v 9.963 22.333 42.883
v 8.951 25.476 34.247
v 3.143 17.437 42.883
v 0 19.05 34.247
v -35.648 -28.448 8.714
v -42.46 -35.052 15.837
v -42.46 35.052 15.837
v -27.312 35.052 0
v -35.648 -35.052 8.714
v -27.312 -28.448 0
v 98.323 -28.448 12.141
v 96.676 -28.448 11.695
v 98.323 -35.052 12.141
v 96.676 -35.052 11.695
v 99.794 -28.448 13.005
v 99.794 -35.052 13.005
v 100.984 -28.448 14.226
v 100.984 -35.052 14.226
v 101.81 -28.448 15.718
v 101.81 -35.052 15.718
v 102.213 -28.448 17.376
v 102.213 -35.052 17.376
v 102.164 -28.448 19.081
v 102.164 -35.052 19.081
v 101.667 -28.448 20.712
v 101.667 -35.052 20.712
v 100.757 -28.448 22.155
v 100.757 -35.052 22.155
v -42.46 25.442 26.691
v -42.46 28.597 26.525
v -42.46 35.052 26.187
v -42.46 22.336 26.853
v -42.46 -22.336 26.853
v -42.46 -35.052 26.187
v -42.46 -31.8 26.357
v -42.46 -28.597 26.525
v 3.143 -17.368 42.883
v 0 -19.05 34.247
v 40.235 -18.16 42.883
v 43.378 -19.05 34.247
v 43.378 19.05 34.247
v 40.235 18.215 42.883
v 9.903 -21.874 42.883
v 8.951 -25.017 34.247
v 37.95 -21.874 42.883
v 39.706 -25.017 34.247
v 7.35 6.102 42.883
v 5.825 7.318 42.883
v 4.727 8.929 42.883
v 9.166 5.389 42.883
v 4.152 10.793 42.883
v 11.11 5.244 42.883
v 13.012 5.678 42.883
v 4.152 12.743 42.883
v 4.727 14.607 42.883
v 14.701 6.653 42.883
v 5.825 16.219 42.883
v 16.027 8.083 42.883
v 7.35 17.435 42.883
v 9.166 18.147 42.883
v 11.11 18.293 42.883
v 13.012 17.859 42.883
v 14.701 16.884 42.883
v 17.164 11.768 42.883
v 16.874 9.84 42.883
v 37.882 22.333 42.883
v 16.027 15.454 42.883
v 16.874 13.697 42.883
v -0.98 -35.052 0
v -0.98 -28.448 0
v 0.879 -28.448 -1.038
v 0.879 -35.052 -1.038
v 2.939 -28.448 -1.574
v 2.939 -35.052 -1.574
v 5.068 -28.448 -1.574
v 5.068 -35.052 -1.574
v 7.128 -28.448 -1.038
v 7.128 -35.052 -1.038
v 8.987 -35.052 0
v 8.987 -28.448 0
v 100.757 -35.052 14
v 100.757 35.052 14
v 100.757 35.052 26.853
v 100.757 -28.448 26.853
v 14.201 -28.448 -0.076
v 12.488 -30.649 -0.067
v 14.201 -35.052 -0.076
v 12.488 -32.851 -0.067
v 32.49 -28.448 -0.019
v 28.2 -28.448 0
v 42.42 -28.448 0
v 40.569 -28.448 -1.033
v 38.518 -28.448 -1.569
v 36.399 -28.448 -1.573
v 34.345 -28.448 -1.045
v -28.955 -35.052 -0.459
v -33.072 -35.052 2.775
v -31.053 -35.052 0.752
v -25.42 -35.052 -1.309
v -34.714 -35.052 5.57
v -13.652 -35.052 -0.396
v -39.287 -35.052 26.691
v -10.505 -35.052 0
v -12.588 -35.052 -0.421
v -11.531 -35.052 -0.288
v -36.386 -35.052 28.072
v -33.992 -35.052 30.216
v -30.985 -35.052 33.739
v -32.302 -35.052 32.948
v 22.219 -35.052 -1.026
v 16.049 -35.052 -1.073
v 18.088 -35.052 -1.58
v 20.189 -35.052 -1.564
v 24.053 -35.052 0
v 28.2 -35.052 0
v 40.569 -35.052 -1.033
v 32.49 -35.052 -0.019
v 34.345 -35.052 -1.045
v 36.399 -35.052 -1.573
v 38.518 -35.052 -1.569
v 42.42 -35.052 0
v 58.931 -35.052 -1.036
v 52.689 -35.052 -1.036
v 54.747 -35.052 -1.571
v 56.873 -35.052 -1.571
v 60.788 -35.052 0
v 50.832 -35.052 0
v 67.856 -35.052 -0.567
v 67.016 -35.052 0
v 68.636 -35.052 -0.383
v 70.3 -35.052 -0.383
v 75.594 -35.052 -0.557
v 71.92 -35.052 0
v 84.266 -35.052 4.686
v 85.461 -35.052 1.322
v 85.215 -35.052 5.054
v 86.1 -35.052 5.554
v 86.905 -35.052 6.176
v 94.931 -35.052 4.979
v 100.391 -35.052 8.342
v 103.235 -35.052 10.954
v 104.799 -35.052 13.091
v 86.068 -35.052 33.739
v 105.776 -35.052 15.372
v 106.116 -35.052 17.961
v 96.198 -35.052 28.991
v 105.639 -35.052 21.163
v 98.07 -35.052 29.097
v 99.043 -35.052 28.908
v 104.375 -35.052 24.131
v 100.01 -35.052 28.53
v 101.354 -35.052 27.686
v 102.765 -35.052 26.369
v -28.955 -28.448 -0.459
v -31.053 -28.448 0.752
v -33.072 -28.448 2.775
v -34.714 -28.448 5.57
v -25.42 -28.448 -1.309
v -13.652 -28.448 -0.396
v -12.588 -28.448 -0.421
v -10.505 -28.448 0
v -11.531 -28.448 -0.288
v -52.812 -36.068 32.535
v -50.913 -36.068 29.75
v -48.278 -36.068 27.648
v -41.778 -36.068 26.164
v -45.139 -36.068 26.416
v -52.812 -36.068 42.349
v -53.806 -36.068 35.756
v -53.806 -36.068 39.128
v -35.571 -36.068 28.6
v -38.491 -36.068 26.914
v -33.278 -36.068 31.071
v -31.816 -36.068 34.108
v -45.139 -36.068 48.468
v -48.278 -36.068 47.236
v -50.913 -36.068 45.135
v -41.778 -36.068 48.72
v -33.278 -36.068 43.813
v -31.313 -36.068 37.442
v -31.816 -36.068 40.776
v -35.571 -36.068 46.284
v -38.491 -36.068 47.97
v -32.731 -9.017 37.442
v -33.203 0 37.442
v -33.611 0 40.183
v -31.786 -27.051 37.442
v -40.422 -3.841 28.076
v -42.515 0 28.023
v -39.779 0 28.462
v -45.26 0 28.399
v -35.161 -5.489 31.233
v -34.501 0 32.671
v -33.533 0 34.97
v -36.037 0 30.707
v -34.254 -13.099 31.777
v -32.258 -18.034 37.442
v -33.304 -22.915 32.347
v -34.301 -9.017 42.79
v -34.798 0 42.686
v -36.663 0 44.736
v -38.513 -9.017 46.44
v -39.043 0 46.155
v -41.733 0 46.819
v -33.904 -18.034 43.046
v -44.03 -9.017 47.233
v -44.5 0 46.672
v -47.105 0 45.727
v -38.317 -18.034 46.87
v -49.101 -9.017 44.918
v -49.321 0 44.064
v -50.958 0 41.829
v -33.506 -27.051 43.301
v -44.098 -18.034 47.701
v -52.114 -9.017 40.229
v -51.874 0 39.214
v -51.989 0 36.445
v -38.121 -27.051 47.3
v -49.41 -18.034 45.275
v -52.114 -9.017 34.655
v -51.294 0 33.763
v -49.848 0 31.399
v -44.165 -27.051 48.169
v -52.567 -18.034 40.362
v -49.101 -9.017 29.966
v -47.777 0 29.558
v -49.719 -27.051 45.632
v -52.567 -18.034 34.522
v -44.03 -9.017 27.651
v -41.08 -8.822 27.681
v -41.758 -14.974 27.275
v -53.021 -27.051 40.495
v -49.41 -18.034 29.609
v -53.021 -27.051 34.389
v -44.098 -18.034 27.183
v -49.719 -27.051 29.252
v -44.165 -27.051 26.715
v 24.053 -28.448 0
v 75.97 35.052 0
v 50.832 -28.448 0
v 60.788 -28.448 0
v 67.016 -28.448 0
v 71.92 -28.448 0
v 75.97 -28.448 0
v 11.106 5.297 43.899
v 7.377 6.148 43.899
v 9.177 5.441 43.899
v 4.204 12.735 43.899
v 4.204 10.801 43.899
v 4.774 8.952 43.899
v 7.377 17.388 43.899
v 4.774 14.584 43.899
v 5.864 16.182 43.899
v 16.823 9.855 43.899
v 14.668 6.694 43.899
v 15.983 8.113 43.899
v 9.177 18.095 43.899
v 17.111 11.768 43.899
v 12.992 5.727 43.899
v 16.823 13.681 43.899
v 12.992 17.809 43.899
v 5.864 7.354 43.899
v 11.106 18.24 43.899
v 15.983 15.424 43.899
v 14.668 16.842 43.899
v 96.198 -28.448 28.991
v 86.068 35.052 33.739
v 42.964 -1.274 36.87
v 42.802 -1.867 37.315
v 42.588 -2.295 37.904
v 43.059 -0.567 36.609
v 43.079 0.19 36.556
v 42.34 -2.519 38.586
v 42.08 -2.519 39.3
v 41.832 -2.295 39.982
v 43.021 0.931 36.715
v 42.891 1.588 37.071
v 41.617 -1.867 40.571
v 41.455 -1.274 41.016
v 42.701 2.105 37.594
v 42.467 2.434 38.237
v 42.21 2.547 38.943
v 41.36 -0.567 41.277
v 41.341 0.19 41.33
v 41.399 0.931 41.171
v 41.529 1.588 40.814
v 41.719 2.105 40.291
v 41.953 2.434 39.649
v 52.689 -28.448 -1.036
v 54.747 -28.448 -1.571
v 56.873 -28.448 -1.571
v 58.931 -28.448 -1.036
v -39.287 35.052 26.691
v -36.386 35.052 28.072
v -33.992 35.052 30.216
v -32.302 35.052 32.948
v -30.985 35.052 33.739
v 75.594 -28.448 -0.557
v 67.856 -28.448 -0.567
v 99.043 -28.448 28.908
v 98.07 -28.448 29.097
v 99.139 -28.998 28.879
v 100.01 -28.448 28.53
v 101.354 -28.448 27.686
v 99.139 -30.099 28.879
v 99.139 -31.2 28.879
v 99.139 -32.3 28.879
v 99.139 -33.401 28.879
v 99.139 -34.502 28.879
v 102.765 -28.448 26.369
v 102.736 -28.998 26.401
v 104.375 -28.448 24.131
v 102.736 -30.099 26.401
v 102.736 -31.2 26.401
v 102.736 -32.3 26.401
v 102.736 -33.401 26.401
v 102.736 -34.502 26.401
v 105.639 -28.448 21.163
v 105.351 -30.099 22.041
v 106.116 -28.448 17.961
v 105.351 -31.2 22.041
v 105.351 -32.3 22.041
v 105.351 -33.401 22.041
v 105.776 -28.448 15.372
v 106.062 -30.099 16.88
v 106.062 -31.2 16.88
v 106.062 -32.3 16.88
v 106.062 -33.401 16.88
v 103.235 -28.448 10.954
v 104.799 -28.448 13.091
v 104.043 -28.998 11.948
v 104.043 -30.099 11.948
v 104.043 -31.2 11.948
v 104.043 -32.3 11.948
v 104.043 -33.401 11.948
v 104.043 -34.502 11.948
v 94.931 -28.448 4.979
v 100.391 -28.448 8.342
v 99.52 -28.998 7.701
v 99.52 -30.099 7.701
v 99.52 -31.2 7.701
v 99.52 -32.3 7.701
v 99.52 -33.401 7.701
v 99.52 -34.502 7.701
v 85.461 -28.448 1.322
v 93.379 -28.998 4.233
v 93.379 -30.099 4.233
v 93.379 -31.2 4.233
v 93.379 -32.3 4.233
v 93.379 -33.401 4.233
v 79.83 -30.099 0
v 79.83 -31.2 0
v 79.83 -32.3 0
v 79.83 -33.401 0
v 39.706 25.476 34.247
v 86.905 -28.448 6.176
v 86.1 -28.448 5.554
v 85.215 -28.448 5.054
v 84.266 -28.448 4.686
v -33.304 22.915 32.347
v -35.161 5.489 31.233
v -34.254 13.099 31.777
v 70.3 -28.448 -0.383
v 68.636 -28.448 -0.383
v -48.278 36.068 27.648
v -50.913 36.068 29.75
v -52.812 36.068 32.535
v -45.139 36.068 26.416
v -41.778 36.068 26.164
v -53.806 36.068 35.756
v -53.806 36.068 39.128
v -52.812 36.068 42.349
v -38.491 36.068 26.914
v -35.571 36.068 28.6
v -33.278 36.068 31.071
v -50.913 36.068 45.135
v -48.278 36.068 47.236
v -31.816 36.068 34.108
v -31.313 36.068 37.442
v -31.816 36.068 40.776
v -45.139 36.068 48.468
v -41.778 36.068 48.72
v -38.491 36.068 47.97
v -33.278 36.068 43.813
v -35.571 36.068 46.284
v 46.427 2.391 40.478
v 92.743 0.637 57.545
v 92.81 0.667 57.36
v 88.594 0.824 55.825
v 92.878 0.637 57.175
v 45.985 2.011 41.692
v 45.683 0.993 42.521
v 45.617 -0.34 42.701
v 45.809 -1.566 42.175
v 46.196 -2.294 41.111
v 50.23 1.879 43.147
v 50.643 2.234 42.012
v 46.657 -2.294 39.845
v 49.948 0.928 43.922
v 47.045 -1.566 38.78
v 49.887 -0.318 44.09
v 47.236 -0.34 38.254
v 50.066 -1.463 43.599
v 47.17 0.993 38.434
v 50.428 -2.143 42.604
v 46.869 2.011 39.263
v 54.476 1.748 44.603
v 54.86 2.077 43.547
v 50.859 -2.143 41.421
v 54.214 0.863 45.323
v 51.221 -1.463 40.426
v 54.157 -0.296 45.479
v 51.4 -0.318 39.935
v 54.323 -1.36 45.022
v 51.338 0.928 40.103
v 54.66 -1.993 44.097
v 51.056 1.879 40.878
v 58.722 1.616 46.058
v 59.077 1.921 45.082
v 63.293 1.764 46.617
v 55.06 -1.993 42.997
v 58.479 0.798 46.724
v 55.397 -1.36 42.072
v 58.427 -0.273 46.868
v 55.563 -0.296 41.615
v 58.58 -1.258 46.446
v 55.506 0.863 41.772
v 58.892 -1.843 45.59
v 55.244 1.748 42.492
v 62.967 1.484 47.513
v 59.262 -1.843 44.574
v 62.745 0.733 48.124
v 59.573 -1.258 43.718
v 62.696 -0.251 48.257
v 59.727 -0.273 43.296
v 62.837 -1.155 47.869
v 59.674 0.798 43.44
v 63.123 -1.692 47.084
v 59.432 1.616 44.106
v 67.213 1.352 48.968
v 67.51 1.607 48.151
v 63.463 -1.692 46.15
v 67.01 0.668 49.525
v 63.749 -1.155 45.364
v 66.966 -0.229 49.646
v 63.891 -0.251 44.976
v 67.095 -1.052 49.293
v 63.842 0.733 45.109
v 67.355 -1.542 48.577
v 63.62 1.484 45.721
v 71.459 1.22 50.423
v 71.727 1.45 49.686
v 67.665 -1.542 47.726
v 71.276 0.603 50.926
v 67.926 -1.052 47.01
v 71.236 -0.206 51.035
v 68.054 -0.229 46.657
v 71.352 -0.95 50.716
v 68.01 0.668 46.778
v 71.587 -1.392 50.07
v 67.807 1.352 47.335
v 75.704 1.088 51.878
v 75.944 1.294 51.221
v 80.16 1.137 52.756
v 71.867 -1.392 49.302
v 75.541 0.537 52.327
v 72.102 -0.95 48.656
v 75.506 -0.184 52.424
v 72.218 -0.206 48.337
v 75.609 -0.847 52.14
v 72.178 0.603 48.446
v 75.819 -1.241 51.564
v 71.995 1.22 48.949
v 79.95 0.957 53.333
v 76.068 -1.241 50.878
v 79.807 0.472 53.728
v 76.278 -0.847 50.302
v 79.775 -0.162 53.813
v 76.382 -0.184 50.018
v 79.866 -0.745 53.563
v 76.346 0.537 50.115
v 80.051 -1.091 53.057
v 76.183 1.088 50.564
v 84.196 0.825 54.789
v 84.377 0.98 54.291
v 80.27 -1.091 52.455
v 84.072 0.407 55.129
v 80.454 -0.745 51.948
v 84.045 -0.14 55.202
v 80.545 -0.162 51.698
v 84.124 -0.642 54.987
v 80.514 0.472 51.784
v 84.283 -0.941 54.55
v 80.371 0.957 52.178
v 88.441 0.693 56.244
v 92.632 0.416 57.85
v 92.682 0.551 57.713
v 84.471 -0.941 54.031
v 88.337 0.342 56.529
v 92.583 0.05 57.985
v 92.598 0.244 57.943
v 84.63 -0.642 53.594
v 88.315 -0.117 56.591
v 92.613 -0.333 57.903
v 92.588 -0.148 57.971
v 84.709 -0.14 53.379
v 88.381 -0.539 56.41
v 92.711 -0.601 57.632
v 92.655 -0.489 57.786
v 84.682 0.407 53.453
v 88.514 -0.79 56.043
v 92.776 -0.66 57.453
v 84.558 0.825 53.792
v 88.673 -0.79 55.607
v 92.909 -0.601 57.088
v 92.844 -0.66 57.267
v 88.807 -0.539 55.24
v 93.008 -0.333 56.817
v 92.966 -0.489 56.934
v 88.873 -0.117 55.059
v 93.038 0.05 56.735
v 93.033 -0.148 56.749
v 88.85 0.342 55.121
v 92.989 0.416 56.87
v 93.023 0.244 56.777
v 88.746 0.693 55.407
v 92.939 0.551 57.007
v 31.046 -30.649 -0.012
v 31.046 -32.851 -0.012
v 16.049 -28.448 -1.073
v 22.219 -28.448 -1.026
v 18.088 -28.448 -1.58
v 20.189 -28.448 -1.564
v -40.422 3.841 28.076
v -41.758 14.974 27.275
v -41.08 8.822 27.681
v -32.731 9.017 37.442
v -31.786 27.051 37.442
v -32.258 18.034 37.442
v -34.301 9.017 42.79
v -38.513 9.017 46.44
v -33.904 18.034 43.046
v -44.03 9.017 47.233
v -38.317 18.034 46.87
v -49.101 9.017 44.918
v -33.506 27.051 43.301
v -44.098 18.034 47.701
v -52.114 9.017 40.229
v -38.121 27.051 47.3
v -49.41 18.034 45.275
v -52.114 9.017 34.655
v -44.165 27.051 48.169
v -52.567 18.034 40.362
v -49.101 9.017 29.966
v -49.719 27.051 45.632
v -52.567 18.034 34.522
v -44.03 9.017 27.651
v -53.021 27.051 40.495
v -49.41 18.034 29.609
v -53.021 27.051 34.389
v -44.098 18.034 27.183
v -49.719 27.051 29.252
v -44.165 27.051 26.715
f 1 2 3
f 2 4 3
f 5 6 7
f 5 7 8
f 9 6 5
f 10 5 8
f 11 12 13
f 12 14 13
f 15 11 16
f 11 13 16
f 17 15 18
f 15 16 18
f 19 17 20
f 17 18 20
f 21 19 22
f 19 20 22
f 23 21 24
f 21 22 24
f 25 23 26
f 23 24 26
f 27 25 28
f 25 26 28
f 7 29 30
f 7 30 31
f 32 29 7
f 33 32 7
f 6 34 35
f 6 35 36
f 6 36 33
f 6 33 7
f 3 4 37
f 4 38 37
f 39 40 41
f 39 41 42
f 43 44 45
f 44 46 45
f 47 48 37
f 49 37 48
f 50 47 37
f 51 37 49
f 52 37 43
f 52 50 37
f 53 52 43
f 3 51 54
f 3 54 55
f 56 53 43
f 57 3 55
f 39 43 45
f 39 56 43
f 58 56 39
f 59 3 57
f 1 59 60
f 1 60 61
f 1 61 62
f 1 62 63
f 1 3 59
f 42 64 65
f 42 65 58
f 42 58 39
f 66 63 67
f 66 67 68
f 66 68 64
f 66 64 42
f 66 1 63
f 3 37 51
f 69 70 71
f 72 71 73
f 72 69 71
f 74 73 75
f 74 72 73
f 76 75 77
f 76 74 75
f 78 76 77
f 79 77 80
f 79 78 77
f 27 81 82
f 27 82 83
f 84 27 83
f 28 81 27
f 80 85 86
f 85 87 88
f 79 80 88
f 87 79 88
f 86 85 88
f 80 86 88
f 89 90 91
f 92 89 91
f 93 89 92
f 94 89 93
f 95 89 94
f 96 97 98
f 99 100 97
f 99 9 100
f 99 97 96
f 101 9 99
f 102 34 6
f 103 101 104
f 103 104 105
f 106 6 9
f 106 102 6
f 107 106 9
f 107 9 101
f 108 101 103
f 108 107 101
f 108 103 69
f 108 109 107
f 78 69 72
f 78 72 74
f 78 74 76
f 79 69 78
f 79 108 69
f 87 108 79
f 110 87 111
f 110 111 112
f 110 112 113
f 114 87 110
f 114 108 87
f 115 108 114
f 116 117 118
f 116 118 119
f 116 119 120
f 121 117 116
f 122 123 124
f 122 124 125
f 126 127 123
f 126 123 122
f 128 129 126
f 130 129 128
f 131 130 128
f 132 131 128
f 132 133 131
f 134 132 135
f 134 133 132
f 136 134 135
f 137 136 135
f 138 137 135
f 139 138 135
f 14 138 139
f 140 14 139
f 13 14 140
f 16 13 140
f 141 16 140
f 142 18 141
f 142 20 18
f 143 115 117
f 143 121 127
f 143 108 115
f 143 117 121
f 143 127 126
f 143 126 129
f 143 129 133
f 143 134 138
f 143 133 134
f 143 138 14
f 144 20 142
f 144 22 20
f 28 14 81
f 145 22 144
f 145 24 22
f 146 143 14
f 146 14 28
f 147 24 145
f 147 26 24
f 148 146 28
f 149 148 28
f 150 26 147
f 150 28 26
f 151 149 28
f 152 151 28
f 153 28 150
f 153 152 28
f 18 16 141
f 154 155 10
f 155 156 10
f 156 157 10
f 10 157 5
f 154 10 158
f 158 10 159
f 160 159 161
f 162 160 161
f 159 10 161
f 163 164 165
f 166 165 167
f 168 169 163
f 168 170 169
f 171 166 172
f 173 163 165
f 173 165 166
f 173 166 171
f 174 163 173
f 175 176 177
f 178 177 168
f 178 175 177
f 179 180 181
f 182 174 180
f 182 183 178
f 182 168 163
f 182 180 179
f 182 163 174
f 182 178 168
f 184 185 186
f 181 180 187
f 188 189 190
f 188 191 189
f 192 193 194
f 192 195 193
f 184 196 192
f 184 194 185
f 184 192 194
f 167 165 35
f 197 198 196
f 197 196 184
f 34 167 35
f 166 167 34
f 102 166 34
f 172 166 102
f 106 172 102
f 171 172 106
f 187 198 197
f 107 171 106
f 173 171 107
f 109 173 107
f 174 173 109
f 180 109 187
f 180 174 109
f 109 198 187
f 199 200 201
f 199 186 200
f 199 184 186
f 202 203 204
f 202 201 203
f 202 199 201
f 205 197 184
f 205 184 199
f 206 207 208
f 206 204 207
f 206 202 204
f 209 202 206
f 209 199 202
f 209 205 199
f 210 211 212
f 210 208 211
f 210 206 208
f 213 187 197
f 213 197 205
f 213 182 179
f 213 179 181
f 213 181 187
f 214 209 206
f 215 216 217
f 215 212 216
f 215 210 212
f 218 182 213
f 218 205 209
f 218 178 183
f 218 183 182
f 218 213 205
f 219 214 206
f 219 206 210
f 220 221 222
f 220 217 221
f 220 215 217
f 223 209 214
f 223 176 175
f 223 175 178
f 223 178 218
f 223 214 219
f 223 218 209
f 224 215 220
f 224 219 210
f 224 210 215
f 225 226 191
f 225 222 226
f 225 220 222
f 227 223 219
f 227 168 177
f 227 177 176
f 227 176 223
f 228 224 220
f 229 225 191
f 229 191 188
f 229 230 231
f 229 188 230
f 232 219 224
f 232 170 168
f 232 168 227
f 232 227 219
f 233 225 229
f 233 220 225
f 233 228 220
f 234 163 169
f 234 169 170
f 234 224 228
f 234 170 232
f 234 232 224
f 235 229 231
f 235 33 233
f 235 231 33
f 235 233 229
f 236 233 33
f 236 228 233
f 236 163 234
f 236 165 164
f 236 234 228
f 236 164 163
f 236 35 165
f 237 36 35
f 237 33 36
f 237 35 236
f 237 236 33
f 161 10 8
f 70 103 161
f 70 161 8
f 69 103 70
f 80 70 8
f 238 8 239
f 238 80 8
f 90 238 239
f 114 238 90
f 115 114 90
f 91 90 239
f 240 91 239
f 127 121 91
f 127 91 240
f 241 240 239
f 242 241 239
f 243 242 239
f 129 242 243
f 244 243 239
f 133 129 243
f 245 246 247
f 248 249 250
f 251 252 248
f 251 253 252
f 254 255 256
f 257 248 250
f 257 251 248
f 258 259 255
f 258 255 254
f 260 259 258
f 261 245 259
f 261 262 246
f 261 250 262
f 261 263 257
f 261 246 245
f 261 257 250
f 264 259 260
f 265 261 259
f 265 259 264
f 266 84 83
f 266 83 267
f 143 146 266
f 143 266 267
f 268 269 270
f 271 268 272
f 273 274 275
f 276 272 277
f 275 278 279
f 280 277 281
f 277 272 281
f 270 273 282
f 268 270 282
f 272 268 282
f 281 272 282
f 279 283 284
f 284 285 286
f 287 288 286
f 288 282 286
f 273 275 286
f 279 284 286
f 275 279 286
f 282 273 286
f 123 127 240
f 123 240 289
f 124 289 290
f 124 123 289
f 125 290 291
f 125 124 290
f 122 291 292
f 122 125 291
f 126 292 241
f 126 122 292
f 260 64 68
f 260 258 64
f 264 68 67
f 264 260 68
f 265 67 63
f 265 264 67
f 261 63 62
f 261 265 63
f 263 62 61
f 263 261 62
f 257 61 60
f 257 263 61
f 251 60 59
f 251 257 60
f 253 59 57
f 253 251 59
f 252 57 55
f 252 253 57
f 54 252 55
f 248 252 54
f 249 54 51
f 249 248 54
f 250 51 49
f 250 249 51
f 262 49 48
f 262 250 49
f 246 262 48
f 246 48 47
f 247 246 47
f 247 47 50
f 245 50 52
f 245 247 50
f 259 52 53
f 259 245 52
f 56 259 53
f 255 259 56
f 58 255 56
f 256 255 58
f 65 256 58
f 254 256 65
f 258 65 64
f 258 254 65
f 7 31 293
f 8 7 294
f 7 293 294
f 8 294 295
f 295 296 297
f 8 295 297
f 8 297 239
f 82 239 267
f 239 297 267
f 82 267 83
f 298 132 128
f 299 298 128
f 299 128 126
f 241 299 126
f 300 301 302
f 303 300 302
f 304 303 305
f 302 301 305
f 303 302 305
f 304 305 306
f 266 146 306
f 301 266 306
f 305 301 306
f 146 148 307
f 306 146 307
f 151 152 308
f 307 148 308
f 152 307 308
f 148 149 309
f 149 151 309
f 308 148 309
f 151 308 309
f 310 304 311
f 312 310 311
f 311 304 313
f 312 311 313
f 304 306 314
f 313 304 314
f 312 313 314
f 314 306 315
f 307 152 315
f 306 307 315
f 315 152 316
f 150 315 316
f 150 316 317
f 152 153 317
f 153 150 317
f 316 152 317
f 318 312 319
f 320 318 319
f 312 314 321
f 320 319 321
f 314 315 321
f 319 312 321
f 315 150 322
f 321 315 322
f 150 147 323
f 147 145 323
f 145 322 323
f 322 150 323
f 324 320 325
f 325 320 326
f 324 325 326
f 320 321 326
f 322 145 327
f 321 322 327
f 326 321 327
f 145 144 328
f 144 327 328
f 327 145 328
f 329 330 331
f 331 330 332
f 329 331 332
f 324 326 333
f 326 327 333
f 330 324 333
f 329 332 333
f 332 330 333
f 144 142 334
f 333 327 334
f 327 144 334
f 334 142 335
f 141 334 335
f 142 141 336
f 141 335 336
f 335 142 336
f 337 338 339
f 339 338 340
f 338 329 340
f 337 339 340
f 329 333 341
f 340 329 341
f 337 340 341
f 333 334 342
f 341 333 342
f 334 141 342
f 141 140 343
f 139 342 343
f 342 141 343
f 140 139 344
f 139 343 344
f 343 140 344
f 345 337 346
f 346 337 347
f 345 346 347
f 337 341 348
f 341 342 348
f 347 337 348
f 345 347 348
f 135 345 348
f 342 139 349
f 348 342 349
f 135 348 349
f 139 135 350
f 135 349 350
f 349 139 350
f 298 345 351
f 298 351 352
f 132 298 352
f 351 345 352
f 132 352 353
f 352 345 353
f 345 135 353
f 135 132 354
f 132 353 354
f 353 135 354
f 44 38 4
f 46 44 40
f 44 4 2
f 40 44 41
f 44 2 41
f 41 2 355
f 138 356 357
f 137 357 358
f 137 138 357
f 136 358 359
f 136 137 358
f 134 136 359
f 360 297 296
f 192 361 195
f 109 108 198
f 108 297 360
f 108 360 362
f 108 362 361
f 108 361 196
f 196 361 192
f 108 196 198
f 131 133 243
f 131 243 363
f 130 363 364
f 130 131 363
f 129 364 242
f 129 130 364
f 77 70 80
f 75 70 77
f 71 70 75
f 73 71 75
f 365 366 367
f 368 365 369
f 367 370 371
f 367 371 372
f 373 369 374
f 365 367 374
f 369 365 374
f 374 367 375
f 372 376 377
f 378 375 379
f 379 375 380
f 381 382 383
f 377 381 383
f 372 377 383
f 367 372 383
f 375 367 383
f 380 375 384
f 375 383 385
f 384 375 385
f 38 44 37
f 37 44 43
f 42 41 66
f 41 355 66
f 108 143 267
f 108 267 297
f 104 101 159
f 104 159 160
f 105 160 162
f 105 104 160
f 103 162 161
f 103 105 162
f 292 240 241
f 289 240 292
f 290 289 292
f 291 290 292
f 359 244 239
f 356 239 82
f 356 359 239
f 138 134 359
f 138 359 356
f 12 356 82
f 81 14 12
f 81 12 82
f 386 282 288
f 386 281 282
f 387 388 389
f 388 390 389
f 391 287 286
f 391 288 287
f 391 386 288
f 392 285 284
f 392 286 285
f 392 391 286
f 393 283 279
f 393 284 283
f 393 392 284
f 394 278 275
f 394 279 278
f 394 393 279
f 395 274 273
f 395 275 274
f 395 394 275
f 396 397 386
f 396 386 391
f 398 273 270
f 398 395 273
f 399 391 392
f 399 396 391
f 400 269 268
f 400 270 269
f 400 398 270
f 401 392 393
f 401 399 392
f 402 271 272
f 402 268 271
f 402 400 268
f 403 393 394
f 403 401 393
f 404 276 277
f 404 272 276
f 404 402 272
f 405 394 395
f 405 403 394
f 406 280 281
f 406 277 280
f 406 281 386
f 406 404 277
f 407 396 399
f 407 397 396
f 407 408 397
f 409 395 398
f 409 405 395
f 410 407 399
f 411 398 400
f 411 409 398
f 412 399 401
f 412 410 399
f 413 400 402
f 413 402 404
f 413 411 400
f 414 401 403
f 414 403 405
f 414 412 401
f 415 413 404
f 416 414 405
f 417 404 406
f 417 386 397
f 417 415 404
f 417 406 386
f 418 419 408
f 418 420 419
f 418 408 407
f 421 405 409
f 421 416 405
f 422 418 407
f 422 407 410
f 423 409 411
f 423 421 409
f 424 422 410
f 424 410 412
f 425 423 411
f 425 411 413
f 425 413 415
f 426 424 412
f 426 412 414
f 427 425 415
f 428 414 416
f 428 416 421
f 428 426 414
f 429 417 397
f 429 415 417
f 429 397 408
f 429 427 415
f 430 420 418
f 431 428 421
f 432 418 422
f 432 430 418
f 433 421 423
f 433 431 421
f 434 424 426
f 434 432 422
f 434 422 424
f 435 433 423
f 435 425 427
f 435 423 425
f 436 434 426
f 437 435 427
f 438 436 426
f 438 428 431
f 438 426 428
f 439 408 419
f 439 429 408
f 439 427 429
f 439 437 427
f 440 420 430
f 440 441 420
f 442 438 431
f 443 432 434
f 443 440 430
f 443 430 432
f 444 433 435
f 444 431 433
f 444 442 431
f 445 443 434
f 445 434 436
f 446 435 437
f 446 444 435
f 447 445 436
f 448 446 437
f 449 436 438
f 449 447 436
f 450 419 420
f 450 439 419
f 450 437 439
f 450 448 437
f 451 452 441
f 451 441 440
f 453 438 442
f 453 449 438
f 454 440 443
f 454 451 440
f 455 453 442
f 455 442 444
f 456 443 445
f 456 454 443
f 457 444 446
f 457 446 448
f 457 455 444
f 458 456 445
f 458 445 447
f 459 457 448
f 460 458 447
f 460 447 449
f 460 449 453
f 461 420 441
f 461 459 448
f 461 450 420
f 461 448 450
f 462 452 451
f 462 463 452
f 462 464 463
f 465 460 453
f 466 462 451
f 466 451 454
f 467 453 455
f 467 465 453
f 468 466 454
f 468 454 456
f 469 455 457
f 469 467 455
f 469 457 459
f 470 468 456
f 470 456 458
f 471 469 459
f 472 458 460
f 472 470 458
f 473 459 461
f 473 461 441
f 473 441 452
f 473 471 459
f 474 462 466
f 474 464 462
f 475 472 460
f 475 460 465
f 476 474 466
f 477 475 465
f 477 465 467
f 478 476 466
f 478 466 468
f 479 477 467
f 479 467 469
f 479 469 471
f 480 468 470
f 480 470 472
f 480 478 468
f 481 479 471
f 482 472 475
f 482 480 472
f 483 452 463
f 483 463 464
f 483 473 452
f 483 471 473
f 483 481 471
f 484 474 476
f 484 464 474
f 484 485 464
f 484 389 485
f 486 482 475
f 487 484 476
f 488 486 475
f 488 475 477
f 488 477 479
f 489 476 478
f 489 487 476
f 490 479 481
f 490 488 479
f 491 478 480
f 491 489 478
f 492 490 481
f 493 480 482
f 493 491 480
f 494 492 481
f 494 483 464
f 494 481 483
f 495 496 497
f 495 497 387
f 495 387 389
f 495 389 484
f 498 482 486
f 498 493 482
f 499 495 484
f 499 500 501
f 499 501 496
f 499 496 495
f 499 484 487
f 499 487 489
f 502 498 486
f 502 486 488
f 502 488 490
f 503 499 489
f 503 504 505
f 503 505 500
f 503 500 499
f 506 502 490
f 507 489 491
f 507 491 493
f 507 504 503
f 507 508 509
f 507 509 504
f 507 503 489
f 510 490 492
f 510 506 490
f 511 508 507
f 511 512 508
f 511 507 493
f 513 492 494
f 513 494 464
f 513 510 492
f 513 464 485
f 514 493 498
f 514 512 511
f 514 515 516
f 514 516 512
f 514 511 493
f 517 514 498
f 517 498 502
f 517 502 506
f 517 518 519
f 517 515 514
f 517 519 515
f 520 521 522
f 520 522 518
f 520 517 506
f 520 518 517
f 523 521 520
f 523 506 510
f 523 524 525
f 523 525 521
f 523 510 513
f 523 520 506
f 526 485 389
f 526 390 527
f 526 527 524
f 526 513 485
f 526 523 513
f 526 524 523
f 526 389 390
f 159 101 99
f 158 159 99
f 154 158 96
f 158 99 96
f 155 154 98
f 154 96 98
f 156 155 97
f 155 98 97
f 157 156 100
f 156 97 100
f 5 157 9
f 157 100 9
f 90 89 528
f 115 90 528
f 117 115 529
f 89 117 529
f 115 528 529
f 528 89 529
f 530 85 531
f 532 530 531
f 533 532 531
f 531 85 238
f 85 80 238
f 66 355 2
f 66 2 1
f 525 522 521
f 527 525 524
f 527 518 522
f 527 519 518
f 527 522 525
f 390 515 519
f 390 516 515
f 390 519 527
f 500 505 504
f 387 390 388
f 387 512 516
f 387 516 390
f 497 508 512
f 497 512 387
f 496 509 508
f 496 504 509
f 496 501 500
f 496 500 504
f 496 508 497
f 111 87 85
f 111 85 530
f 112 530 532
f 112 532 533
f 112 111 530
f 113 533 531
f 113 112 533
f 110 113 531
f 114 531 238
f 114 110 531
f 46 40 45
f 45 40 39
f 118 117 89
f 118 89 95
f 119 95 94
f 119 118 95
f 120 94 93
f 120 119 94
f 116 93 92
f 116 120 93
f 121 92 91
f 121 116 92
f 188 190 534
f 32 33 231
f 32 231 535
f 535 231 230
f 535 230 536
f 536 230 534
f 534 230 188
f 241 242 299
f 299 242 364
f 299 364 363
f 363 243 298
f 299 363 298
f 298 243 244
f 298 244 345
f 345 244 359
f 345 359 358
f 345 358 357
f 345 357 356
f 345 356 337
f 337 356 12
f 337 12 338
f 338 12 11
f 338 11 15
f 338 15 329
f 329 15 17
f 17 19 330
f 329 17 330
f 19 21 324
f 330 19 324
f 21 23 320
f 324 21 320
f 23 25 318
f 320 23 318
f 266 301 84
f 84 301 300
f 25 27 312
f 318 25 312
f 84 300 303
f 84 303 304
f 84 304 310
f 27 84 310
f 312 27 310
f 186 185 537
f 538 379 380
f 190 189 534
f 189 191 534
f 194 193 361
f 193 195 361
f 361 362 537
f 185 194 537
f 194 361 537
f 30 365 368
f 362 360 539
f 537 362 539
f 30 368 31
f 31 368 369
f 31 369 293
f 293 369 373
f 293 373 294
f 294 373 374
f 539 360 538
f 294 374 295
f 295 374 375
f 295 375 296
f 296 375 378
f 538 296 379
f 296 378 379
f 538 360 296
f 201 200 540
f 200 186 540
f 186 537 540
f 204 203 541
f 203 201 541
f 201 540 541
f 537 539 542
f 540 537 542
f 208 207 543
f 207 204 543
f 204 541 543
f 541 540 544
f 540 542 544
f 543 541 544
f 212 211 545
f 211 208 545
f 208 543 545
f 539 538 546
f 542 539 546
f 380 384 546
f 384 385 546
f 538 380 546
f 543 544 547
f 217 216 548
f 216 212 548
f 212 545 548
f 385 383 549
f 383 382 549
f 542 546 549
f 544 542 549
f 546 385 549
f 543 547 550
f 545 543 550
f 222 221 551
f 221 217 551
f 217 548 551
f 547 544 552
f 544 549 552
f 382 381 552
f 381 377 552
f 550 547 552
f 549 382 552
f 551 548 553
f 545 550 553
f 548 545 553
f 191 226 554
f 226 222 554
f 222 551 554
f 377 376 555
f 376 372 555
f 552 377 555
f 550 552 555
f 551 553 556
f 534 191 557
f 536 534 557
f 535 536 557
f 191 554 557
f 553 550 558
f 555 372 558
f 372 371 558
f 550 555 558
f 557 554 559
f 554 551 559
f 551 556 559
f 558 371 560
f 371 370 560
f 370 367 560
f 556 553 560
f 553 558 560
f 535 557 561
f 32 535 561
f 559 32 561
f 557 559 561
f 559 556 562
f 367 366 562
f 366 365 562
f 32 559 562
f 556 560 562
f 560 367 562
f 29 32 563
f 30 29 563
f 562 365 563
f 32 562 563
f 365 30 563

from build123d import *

# Parameters (mm, degrees)
F1_DEPTH  = 35.052
F4_DEPTH  = 8.636
F4_TAPER  = 20
F6_R      = 2.5473797884
F7_DEPTH  = 53.848
F7_TAPER  = 2
F8_R      = 9.4193845987
F9_DEPTH  = 36.068
F9_TAPER  = -3
F11_R     = 6.5429136155
F12_DEPTH = 1.016
F12_TAPER = 3
F14_R     = 6.4058769263
F15_DEPTH = 6.604


with BuildPart() as f1:
    # F0 (on Front) → F1 (new body, symmetric)
    with BuildSketch(Plane.XZ):
        Polygon((-27.3123774678, 0), (0, 0), (75.9697407484, 0), (100.7574498653, 14.0004679561), (100.7574498653, 26.8533546478), (86.0684290528, 33.7388291955), (-30.9846308082, 33.7388291955), (-42.4604192376, 26.8533546478), (-42.4604192376, 15.836596489), align=None)
    extrude(amount=F1_DEPTH, both=True)

    # F8 (on Front) → F9 (join, symmetric)
    with BuildSketch(Plane.XZ):
        with Locations((-42.62271896, 37.4420583248)):
            Circle(F8_R)
    extrude(amount=F9_DEPTH, both=True, taper=F9_TAPER)

    # F14 (on offset) → F15 (join)
    with BuildSketch(Plane.XZ.offset(35.052)):
        with BuildLine():
            ThreePointArc((-18.2914277318, 11.5336464741), (-18.238567493, 11.0237022138), (-18.2209195306, 10.5113293976))
            ThreePointArc((-18.2209195306, 10.5113293976), (-18.690216693, 7.9095667226), (-20.0389570113, 5.6357355069))
            ThreePointArc((-20.0389570113, 5.6357355069), (-17.8768605229, 1.5281653135), (-13.6524536622, -0.3956800012))
            add(Edge.make_bspline(
                [(-10.5050824736, 0), (-11.5477199799, -0.1099032554), (-12.6000289403, -0.2485209166), (-13.6524536622, -0.3956800012)],
                knots=[0.8894547449, 0.8894547449, 0.8894547449, 0.8894547449, 0.898296643, 0.898296643, 0.898296643, 0.898296643], degree=3))
            ThreePointArc((-10.5050824736, 0), (-7.0773531131, 2.6258490959), (-5.7778356714, 6.7435749806))
            ThreePointArc((-5.7778356714, 6.7435749806), (-10.3869168212, 13.4431042769), (-18.2914277318, 11.5336464741))
        make_face()
        with BuildLine():
            ThreePointArc((-20.0389570113, 5.6357355069), (-32.8074565022, 12.6268435661), (-18.2914277318, 11.5336464741))
            ThreePointArc((-18.2914277318, 11.5336464741), (-10.3869168212, 13.4431042769), (-5.7778356714, 6.7435749806))
            ThreePointArc((-5.7778356714, 6.7435749806), (-7.0773531131, 2.6258490959), (-10.5050824736, 0))
            add(Edge.make_bspline(
                [(-1.4377133298, 0.3632930094), (-4.360674288, 0.4004144231), (-7.3897049606, 0.3283884651), (-10.5050824736, 0)],
                knots=[0.8630353512, 0.8630353512, 0.8630353512, 0.8630353512, 0.8894547449, 0.8894547449, 0.8894547449, 0.8894547449], degree=3))
            ThreePointArc((-1.4377133298, 0.3632930094), (-1.1320375241, 13.372378396), (11.5408509223, 10.4181206688))
            ThreePointArc((11.5408509223, 10.4181206688), (20.9600888035, 14.9107300047), (27.4564847059, 6.7435749806))
            ThreePointArc((27.4564847059, 6.7435749806), (26.5572949313, 2.966608588), (24.0526490745, 0))
            add(Edge.make_bspline(
                [(32.4903987489, -0.0193167116), (29.5866199223, -0.0057281236), (26.7519183568, 0.012216448), (24.0526490745, 0)],
                knots=[0.7505457387, 0.7505457387, 0.7505457387, 0.7505457387, 0.7777542378, 0.7777542378, 0.7777542378, 0.7777542378], degree=3))
            ThreePointArc((32.4903987489, -0.0193167116), (33.6507739321, 14.2190238146), (45.8242892928, 6.7435749806))
            ThreePointArc((45.8242892928, 6.7435749806), (44.9250995182, 2.966608588), (42.4204536614, 0))
            add(Edge.make_bspline(
                [(50.6332553293, 0.1512836344), (47.927415051, 0.1101522639), (45.1762033046, 0.036614238), (42.4204536614, 0)],
                knots=[0.6948509829, 0.6948509829, 0.6948509829, 0.6948509829, 0.720052008, 0.720052008, 0.720052008, 0.720052008], degree=3))
            ThreePointArc((50.6332553293, 0.1512836344), (50.5277699262, 13.2516481983), (63.32628389, 10.4536633528))
            ThreePointArc((63.32628389, 10.4536633528), (69.0279887166, 13.9055593882), (75.1095131316, 11.1779074751))
            ThreePointArc((75.1095131316, 11.1779074751), (82.0466679625, 18.5321466628), (89.2645921606, 11.4532681182))
            ThreePointArc((89.2645921606, 11.4532681182), (84.513834766, 4.7672305336), (76.6369867203, 7.0537255085))
            ThreePointArc((76.6369867203, 7.0537255085), (76.6420160513, 6.8986864896), (76.6436927562, 6.7435749806))
            ThreePointArc((76.6436927562, 6.7435749806), (71.3938787613, -0.1686991502), (63.32628389, 3.0334866085))
            ThreePointArc((63.32628389, 3.0334866085), (62.2387569182, 1.3648978533), (60.788254523, 0))
            add(Edge.make_bspline(
                [(-35.5579517782, 13.3371446282), (-34.5184446926, 17.9286186225), (-26.3512458362, 25.383448883), (-15.4597608895, 14.7250766477), (0.0686718679, 20.4326772039), (15.8560525983, 17.8310843141), (28.9072902188, 16.8316877811), (46.8073326751, 17.4266330572), (63.7497315728, 16.0582979772), (85.5235545067, 21.172510386), (99.3038248874, 34.2444686992), (113.1382509082, 11.3105872038), (78.7221199692, -2.6913634642), (66.6651528526, -0.3678101121), (60.788254523, 0)],
                knots=[0, 0, 0, 0, 0.0472697059, 0.0940487795, 0.1468349219, 0.2003618261, 0.2493162293, 0.3055194392, 0.3617226461, 0.4256051466, 0.4773681285, 0.5298011539, 0.6035992514, 0.6623497839, 0.6623497839, 0.6623497839, 0.6623497839], degree=3))
            add(Edge.make_bspline(
                [(-13.6524536622, -0.3956800012), (-19.6587209768, -1.2355280026), (-31.7717668805, -3.4889197494), (-36.6848129863, 8.3598298949), (-35.5579517782, 13.3371446282)],
                knots=[0.898296643, 0.898296643, 0.898296643, 0.898296643, 0.9487580232, 1, 1, 1, 1], degree=3))
            ThreePointArc((-13.6524536622, -0.3956800012), (-17.8768605229, 1.5281653135), (-20.0389570113, 5.6357355069))
        make_face()
        with Locations((95.8424806595, 18.0468373001)):
            Circle(F14_R, mode=Mode.SUBTRACT)
        with BuildLine():
            add(Edge.make_bspline(
                [(-10.5050824736, 0), (-11.5477199799, -0.1099032554), (-12.6000289403, -0.2485209166), (-13.6524536622, -0.3956800012)],
                knots=[0.8894547449, 0.8894547449, 0.8894547449, 0.8894547449, 0.898296643, 0.898296643, 0.898296643, 0.898296643], degree=3))
            ThreePointArc((-13.6524536622, -0.3956800012), (-12.0566229362, -0.3739897919), (-10.5050824736, 0))
        make_face()
        with BuildLine():
            add(Edge.make_bspline(
                [(8.9873047473, 0), (5.7036984444, 0.0999626727), (2.2158534233, 0.3168929498), (-1.4377133298, 0.3632930094)],
                knots=[0.8300123242, 0.8300123242, 0.8300123242, 0.8300123242, 0.8630353512, 0.8630353512, 0.8630353512, 0.8630353512], degree=3))
            ThreePointArc((-1.4377133298, 0.3632930094), (3.7114293188, -1.6367087735), (8.9873047473, 0))
        make_face()
        with BuildLine():
            ThreePointArc((11.5408509223, 10.4181206688), (-1.1320375241, 13.372378396), (-1.4377133298, 0.3632930094))
            add(Edge.make_bspline(
                [(8.9873047473, 0), (5.7036984444, 0.0999626727), (2.2158534233, 0.3168929498), (-1.4377133298, 0.3632930094)],
                knots=[0.8300123242, 0.8300123242, 0.8300123242, 0.8300123242, 0.8630353512, 0.8630353512, 0.8630353512, 0.8630353512], degree=3))
            ThreePointArc((8.9873047473, 0), (10.4493946476, 1.3803241862), (11.5408509223, 3.0690292925))
            ThreePointArc((11.5408509223, 3.0690292925), (10.6924847059, 6.7435749806), (11.5408509223, 10.4181206688))
        make_face()
        with BuildLine():
            add(Edge.make_bspline(
                [(60.788254523, 0), (57.5371139135, 0.2034750858), (54.1229170875, 0.2043298441), (50.6332553293, 0.1512836344)],
                knots=[0.6623497839, 0.6623497839, 0.6623497839, 0.6623497839, 0.6948509829, 0.6948509829, 0.6948509829, 0.6948509829], degree=3))
            ThreePointArc((60.788254523, 0), (62.2387569182, 1.3648978533), (63.32628389, 3.0334866085))
            ThreePointArc((63.32628389, 3.0334866085), (62.2926927562, 6.7435749806), (63.32628389, 10.4536633528))
            ThreePointArc((63.32628389, 10.4536633528), (50.5277699262, 13.2516481983), (50.6332553293, 0.1512836344))
        make_face()
        with BuildLine():
            ThreePointArc((50.6332553293, 0.1512836344), (55.6852335483, -1.6374950482), (60.788254523, 0))
            add(Edge.make_bspline(
                [(60.788254523, 0), (57.5371139135, 0.2034750858), (54.1229170875, 0.2043298441), (50.6332553293, 0.1512836344)],
                knots=[0.6623497839, 0.6623497839, 0.6623497839, 0.6623497839, 0.6948509829, 0.6948509829, 0.6948509829, 0.6948509829], degree=3))
        make_face()
        with BuildLine():
            ThreePointArc((27.4564847059, 6.7435749806), (20.9600888035, 14.9107300047), (11.5408509223, 10.4181206688))
            ThreePointArc((11.5408509223, 10.4181206688), (12.1740912442, 8.6291364129), (12.3888377414, 6.7435749806))
            ThreePointArc((12.3888377414, 6.7435749806), (12.1740912442, 4.8580135484), (11.5408509223, 3.0690292925))
            ThreePointArc((11.5408509223, 3.0690292925), (12.6745379692, 1.3307563279), (14.2005443452, -0.0757086592))
            add(Edge.make_bspline(
                [(24.0526490745, 0), (20.6486292111, -0.015406033), (17.4599935999, -0.0787785369), (14.2005443452, -0.0757086592)],
                knots=[0.7777542378, 0.7777542378, 0.7777542378, 0.7777542378, 0.8120665875, 0.8120665875, 0.8120665875, 0.8120665875], degree=3))
            ThreePointArc((24.0526490745, 0), (26.5572949313, 2.966608588), (27.4564847059, 6.7435749806))
        make_face()
        with BuildLine():
            ThreePointArc((11.5408509223, 3.0690292925), (10.4493946476, 1.3803241862), (8.9873047473, 0))
            add(Edge.make_bspline(
                [(14.2005443452, -0.0757086592), (12.495816486, -0.0741030793), (10.7717182259, -0.0543228158), (8.9873047473, 0)],
                knots=[0.8120665875, 0.8120665875, 0.8120665875, 0.8120665875, 0.8300123242, 0.8300123242, 0.8300123242, 0.8300123242], degree=3))
            ThreePointArc((14.2005443452, -0.0757086592), (12.6745379692, 1.3307563279), (11.5408509223, 3.0690292925))
        make_face()
        with BuildLine():
            add(Edge.make_bspline(
                [(24.0526490745, 0), (20.6486292111, -0.015406033), (17.4599935999, -0.0787785369), (14.2005443452, -0.0757086592)],
                knots=[0.7777542378, 0.7777542378, 0.7777542378, 0.7777542378, 0.8120665875, 0.8120665875, 0.8120665875, 0.8120665875], degree=3))
            ThreePointArc((14.2005443452, -0.0757086592), (19.1388944197, -1.6381775443), (24.0526490745, 0))
        make_face()
        with BuildLine():
            add(Edge.make_bspline(
                [(42.4204536614, 0), (39.0859429569, -0.0443039407), (35.744788104, -0.0345460244), (32.4903987489, -0.0193167116)],
                knots=[0.720052008, 0.720052008, 0.720052008, 0.720052008, 0.7505457387, 0.7505457387, 0.7505457387, 0.7505457387], degree=3))
            ThreePointArc((42.4204536614, 0), (44.9250995182, 2.966608588), (45.8242892928, 6.7435749806))
            ThreePointArc((45.8242892928, 6.7435749806), (33.6507739321, 14.2190238146), (32.4903987489, -0.0193167116))
        make_face()
        with BuildLine():
            ThreePointArc((32.4903987489, -0.0193167116), (37.4585945773, -1.6384091602), (42.4204536614, 0))
            add(Edge.make_bspline(
                [(42.4204536614, 0), (39.0859429569, -0.0443039407), (35.744788104, -0.0345460244), (32.4903987489, -0.0193167116)],
                knots=[0.720052008, 0.720052008, 0.720052008, 0.720052008, 0.7505457387, 0.7505457387, 0.7505457387, 0.7505457387], degree=3))
        make_face()
    extrude(amount=-F15_DEPTH)


with BuildPart() as f4:
    # F3 (on offset) → F4 (new body)
    with BuildSketch(Plane.XY.offset(34.2468291955)):
        Polygon((0, 19.049808383), (0, 0), (0, -19.05), (8.9511210099, -25.0172279775), (39.7062413394, -25.0172279775), (43.3784909546, -19.05), (43.3784909546, 19.049808383), (39.7062413394, 25.4762507975), (8.9511210099, 25.4762507975), align=None)
    extrude(amount=F4_DEPTH, taper=F4_TAPER)

    # F11 (on offset) → F12 (join)
    with BuildSketch(Plane.XY.offset(42.8828291955)):
        with Locations((10.6214676052, 11.7682609707)):
            Circle(F11_R)
    extrude(amount=F12_DEPTH, taper=F12_TAPER)


with BuildPart() as f7:
    # F6 (on offset) → F7 (new body)
    with BuildSketch(Plane(origin=(49.788254041, 0, 18.121442487), x_dir=(0, 1, 0), z_dir=(0.9396926208, 0, 0.3420201433))):
        with Locations((0, 22.1577808261)):
            Circle(F6_R)
    extrude(amount=F7_DEPTH, taper=F7_TAPER)


solid = Compound([f1.part, f4.part, f7.part])
